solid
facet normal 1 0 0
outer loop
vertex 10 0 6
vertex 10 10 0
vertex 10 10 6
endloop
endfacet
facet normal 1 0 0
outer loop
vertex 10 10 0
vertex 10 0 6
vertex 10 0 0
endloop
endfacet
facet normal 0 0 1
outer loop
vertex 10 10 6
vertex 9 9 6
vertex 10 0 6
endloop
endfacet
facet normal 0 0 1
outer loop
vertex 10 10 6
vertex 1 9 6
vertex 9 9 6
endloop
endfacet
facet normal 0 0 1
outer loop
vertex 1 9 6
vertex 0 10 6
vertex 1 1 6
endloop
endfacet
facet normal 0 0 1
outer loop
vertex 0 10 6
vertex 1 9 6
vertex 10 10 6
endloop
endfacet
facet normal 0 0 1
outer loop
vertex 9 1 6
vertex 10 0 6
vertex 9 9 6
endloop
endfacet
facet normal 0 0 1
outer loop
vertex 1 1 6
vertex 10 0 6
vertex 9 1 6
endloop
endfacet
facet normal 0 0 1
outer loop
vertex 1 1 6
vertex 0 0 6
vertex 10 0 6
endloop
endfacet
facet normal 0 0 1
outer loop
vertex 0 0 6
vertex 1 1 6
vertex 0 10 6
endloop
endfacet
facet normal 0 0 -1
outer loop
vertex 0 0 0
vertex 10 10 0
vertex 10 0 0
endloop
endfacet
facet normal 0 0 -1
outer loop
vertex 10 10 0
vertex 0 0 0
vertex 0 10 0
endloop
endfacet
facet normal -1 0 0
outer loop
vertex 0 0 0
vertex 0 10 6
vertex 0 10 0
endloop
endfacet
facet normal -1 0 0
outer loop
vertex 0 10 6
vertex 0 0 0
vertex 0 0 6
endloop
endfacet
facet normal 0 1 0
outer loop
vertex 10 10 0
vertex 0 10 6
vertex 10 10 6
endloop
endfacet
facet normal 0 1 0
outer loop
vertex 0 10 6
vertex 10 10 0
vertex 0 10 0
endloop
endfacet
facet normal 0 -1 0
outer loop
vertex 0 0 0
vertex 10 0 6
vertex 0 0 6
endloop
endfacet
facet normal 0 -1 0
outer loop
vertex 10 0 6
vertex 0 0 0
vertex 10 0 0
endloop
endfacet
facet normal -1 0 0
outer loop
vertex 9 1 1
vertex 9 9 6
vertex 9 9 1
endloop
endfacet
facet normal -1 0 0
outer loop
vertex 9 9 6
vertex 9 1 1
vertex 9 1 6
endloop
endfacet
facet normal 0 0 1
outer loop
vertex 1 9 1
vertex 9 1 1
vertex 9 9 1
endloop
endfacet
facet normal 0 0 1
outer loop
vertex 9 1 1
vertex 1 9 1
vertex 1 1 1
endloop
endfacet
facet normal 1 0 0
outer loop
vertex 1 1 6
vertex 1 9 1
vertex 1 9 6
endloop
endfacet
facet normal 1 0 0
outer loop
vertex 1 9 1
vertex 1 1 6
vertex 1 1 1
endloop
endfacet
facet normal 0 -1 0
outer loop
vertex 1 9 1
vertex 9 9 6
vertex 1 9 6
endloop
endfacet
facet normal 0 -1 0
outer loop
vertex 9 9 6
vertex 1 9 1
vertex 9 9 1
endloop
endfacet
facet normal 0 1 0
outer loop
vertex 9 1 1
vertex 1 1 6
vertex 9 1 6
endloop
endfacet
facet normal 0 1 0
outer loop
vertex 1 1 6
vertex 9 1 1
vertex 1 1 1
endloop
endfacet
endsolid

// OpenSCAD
difference() {
    cube( [ 10, 10, 6 ]);
    translate( [ 1, 1, 1 ] ) {
        cube( [ 8, 8, 6 ] );
    }
}
